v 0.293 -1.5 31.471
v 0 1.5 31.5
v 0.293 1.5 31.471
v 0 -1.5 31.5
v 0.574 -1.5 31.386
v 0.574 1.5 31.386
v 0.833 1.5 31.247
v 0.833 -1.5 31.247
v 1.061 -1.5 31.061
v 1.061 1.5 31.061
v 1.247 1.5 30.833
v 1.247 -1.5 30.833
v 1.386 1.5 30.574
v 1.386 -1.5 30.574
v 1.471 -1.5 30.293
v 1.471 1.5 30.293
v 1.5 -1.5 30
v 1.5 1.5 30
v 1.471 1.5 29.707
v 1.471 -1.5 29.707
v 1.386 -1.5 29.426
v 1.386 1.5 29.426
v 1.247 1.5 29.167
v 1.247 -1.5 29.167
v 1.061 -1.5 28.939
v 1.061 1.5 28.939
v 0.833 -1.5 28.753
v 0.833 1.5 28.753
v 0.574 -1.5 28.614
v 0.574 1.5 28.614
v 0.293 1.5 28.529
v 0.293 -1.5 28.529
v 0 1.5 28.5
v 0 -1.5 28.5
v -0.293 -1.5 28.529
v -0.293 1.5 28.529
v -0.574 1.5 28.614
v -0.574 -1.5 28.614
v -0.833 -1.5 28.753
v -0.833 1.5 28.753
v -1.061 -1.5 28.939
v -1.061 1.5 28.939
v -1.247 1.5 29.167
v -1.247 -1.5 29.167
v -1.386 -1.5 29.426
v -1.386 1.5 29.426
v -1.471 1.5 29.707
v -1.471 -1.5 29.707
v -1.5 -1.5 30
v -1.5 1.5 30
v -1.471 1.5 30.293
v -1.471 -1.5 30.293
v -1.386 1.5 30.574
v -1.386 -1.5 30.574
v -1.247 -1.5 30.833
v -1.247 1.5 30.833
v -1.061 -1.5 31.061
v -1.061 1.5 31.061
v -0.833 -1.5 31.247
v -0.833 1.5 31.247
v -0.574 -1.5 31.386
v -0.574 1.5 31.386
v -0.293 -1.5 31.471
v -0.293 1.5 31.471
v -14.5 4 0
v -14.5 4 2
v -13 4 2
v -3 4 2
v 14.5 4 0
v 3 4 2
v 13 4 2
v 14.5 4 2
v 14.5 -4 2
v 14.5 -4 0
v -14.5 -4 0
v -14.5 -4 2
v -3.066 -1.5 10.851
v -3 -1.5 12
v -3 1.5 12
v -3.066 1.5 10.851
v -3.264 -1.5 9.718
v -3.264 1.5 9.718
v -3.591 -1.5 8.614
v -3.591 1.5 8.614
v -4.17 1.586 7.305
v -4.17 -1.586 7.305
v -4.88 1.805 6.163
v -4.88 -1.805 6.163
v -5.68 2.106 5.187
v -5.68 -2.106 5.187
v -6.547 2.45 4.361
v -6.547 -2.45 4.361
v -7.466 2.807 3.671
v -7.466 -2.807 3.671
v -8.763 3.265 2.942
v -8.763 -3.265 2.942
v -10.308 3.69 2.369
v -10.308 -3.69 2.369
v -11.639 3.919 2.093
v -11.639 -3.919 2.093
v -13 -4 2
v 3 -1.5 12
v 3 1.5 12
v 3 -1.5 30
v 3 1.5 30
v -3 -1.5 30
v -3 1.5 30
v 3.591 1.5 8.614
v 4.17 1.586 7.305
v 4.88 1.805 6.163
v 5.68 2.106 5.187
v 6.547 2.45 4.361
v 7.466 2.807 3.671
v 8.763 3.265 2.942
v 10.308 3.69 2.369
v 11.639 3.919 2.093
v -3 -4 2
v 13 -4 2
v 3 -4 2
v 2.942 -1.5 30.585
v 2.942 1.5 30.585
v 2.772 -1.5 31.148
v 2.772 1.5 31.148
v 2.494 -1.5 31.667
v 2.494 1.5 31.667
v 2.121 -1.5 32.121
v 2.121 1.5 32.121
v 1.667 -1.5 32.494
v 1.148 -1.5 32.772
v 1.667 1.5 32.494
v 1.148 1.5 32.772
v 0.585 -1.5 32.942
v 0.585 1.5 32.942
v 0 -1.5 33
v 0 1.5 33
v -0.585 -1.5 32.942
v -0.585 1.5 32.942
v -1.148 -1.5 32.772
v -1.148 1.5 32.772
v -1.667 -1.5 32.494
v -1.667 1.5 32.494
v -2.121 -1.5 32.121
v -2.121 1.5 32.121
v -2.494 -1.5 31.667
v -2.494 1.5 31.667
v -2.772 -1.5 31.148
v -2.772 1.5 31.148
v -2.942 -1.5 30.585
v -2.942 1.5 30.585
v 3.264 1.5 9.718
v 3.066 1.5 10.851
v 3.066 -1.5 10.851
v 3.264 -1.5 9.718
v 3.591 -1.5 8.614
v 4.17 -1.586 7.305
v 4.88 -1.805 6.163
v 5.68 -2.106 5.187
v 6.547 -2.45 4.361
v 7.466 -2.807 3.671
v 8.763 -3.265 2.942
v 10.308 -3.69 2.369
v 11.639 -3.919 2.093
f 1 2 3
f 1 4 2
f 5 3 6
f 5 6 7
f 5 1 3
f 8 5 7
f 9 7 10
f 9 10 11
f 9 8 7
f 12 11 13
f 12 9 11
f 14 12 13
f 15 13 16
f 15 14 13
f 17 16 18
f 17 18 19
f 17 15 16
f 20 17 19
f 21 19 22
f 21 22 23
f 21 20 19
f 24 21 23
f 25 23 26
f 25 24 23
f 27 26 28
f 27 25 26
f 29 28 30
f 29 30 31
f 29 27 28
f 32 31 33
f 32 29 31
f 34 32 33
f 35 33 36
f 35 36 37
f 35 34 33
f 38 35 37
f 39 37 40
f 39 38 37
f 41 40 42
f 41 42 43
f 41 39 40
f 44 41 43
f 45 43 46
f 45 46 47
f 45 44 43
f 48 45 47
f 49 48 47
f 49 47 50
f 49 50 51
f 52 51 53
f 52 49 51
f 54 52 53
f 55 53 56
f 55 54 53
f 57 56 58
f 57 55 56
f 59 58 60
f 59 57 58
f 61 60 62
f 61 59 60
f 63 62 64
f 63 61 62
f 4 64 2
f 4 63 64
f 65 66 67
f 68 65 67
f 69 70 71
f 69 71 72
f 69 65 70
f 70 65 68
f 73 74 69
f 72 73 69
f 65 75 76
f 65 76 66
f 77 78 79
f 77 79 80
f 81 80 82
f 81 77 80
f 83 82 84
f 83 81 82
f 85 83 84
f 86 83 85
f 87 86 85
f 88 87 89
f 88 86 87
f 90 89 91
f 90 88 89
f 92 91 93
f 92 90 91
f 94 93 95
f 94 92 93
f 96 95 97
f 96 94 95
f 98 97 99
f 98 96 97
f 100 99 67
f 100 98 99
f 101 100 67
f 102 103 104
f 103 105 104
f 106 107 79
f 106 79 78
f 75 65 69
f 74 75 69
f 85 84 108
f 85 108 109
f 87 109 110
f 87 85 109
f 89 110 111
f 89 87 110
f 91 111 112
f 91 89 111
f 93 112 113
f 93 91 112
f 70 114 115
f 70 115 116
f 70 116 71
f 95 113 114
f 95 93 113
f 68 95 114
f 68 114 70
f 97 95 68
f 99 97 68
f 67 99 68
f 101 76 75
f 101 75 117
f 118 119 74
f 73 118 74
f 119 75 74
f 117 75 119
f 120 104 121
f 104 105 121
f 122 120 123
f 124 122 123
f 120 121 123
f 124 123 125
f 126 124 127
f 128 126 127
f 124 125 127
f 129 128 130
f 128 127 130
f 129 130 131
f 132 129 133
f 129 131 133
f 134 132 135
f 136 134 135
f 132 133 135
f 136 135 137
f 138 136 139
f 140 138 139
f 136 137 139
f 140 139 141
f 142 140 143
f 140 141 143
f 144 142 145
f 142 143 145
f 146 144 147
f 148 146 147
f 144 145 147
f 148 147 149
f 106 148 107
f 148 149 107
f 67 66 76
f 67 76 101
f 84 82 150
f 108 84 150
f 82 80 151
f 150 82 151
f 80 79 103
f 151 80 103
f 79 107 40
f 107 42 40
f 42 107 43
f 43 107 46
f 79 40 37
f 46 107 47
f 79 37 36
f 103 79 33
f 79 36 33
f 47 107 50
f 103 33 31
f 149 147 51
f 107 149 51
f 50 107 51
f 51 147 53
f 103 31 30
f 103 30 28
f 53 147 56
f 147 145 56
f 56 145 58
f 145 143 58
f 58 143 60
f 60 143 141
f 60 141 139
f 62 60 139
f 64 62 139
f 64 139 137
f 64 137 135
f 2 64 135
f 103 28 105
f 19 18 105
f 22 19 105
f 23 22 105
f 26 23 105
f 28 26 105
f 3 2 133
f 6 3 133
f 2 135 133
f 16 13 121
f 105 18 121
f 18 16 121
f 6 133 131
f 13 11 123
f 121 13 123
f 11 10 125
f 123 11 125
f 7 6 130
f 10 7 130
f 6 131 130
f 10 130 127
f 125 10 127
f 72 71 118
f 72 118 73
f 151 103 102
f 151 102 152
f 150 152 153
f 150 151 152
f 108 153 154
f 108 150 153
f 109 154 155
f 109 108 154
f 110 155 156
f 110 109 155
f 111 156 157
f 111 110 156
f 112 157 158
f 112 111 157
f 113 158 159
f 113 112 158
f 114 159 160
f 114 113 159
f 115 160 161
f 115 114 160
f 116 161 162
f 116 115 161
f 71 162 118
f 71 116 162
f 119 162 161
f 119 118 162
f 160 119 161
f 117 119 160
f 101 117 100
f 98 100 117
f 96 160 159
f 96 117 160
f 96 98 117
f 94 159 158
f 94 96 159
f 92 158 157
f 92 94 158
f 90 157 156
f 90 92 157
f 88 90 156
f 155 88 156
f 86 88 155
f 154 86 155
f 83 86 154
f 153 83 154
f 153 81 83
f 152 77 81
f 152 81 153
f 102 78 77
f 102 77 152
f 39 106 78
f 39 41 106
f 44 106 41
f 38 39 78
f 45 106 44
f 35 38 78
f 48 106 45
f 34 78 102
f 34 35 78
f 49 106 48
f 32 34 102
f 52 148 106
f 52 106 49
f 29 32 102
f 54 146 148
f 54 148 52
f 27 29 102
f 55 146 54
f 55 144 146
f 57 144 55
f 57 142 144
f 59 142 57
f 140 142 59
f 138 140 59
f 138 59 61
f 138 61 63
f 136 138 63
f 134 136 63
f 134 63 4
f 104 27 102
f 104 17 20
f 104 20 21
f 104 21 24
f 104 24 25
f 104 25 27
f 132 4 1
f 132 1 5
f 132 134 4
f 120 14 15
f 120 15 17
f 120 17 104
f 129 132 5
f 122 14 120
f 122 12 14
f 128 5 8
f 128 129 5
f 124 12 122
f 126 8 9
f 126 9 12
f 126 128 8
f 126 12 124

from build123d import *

# Parameters (mm, degrees)
SKETCH1_W           = 29
SKETCH1_H           = 8
BOSS_EXTRUDE1_DEPTH = 2
SKETCH2_R           = 1.5
BOSS_EXTRUDE2_DEPTH = 1.5
FILLET1_R           = 10


with BuildPart() as part:
    # Sketch1 → Boss-Extrude1 (new body)
    with BuildSketch(Plane.XY):
        Rectangle(SKETCH1_W, SKETCH1_H)
    extrude(amount=BOSS_EXTRUDE1_DEPTH)

    # Sketch2 → Boss-Extrude2 (add, symmetric)
    with BuildSketch(Plane(origin=(0, 0, 0), x_dir=(1, 0, 0), z_dir=(0, 1, 0))):
        with BuildLine():
            Line((-3, -2), (3, -2))
            Line((3, -2), (3, -30))
            ThreePointArc((3, -30), (0, -33), (-3, -30))
            Line((-3, -30), (-3, -2))
        make_face()
        with Locations(Location((0, -30, 0), (0, 0, 270))):
            Circle(SKETCH2_R, mode=Mode.SUBTRACT)
    extrude(amount=BOSS_EXTRUDE2_DEPTH, both=True)

    # Fillet1
    # the kernel refuses this fillet: 10 mm, written as the material it adds along each edge
    with BuildSketch(Plane(origin=(-3, 1.5, 2), x_dir=(0, 1, 0), z_dir=(1, 0, 0))) as fillet1_piece_1:
        with BuildLine():
            CenterArc((10, 6.614378278), FILLET1_R, 180, 41.409622109)
            Line((0, 6.614378278), (-0.2, 6.614378278))
            Line((-0.2, 6.614378278), (-0.2, 0))
            Line((-0.2, 0), (0, -0.2))
            ThreePointArc((0, -0.2), (1.25, -0.2), (2.35, -0.132287566))
            Line((2.35, -0.132287566), (2.5, 0))
        make_face()
    extrude(amount=6)
    with BuildSketch(Plane(origin=(-3, -1.5, 2), x_dir=(-1, 0, 0), z_dir=(0, 1, 0)), Plane(origin=(3, 1.5, 2), x_dir=(1, 0, 0), z_dir=(0, -1, 0))) as fillet1_piece_2:
        with BuildLine():
            CenterArc((FILLET1_R, FILLET1_R), FILLET1_R, 180, 90)
            Line((0, FILLET1_R), (-FILLET1_R * 0.02, FILLET1_R))
            Line((-FILLET1_R * 0.02, FILLET1_R), (-FILLET1_R * 0.02, -FILLET1_R * 0.02))
            Line((-FILLET1_R * 0.02, -FILLET1_R * 0.02), (FILLET1_R, -FILLET1_R * 0.02))
            Line((FILLET1_R, -FILLET1_R * 0.02), (FILLET1_R, 0))
        make_face()
    extrude(amount=3)
    with BuildSketch(Plane(origin=(-3, -1.5, 2), x_dir=(0, -1, 0), z_dir=(1, 0, 0))) as fillet1_piece_3:
        with BuildLine():
            CenterArc((10, -6.614378278), FILLET1_R, 138.590377891, 41.409622109)
            Line((0, -6.614378278), (-0.2, -6.614378278))
            Line((-0.2, -6.614378278), (-0.2, 0))
            Line((-0.2, 0), (0, 0.2))
            ThreePointArc((0, 0.2), (1.25, 0.2), (2.35, 0.132287566))
            Line((2.35, 0.132287566), (2.5, 0))
        make_face()
    extrude(amount=6)
    with BuildSketch(Plane(origin=(-19.535945694, 1.5, 2), x_dir=(0, 1, 0), z_dir=(1, 0, 0))) as fillet1_piece_4a_section:
        with BuildLine():
            CenterArc((10, 6.614378278), FILLET1_R, 180, 41.409622109)
            Line((0, 6.614378278), (-0.2, 6.614378278))
            Line((-0.2, 6.614378278), (-0.2, 0))
            Line((-0.2, 0), (0, -0.2))
            ThreePointArc((0, -0.2), (1.25, -0.2), (2.35, -0.132287566))
            Line((2.35, -0.132287566), (2.5, 0))
        make_face()
    fillet1_piece_4a = extrude(amount=22.535945694, mode=Mode.PRIVATE)
    fillet1_piece_4a = split(fillet1_piece_4a, bisect_by=Plane(origin=(-14.5, 2.097749904, 3.814075663), z_dir=(1, 0, 0)), keep=Keep.TOP, mode=Mode.PRIVATE)
    fillet1_piece_4a = split(fillet1_piece_4a, bisect_by=Plane(origin=(-3, 2.097749904, 3.814075663), z_dir=(-1, 0, 0)), keep=Keep.TOP, mode=Mode.PRIVATE)
    with BuildSketch(Plane(origin=(-3, -1.5, 2), x_dir=(-1, 0, 0), z_dir=(0, 1, 0))) as fillet1_piece_4b_section:
        with BuildLine():
            CenterArc((FILLET1_R, FILLET1_R), FILLET1_R, 180, 90)
            Line((0, FILLET1_R), (-FILLET1_R * 0.02, FILLET1_R))
            Line((-FILLET1_R * 0.02, FILLET1_R), (-FILLET1_R * 0.02, -FILLET1_R * 0.02))
            Line((-FILLET1_R * 0.02, -FILLET1_R * 0.02), (FILLET1_R, -FILLET1_R * 0.02))
            Line((FILLET1_R, -FILLET1_R * 0.02), (FILLET1_R, 0))
        make_face()
    fillet1_piece_4b = extrude(amount=28, mode=Mode.PRIVATE)
    fillet1_piece_4b = split(fillet1_piece_4b, bisect_by=Plane(origin=(-5.263951143, 4, 4.263951143), z_dir=(0, -1, 0)), keep=Keep.TOP, mode=Mode.PRIVATE)
    fillet1_piece_4b = split(fillet1_piece_4b, bisect_by=Plane(origin=(-5.263951143, 1.5, 4.263951143), z_dir=(0, 1, 0)), keep=Keep.TOP, mode=Mode.PRIVATE)
    fillet1_piece_4 = fillet1_piece_4a & fillet1_piece_4b
    add(fillet1_piece_4)
    with BuildSketch(Plane(origin=(3, 26.5, 2), x_dir=(1, 0, 0), z_dir=(0, -1, 0))) as fillet1_piece_5a_section:
        with BuildLine():
            CenterArc((FILLET1_R, FILLET1_R), FILLET1_R, 180, 90)
            Line((0, FILLET1_R), (-FILLET1_R * 0.02, FILLET1_R))
            Line((-FILLET1_R * 0.02, FILLET1_R), (-FILLET1_R * 0.02, -FILLET1_R * 0.02))
            Line((-FILLET1_R * 0.02, -FILLET1_R * 0.02), (FILLET1_R, -FILLET1_R * 0.02))
            Line((FILLET1_R, -FILLET1_R * 0.02), (FILLET1_R, 0))
        make_face()
    fillet1_piece_5a = extrude(amount=28, mode=Mode.PRIVATE)
    fillet1_piece_5a = split(fillet1_piece_5a, bisect_by=Plane(origin=(5.263951143, 4, 4.263951143), z_dir=(0, -1, 0)), keep=Keep.TOP, mode=Mode.PRIVATE)
    fillet1_piece_5a = split(fillet1_piece_5a, bisect_by=Plane(origin=(5.263951143, 1.5, 4.263951143), z_dir=(0, 1, 0)), keep=Keep.TOP, mode=Mode.PRIVATE)
    with BuildSketch(Plane(origin=(-3, 1.5, 2), x_dir=(0, 1, 0), z_dir=(1, 0, 0))) as fillet1_piece_5b_section:
        with BuildLine():
            CenterArc((10, 6.614378278), FILLET1_R, 180, 41.409622109)
            Line((0, 6.614378278), (-0.2, 6.614378278))
            Line((-0.2, 6.614378278), (-0.2, 0))
            Line((-0.2, 0), (0, -0.2))
            ThreePointArc((0, -0.2), (1.25, -0.2), (2.35, -0.132287566))
            Line((2.35, -0.132287566), (2.5, 0))
        make_face()
    fillet1_piece_5b = extrude(amount=22.535945694, mode=Mode.PRIVATE)
    fillet1_piece_5b = split(fillet1_piece_5b, bisect_by=Plane(origin=(14.5, 2.097749904, 3.814075663), z_dir=(-1, 0, 0)), keep=Keep.TOP, mode=Mode.PRIVATE)
    fillet1_piece_5b = split(fillet1_piece_5b, bisect_by=Plane(origin=(3, 2.097749904, 3.814075663), z_dir=(1, 0, 0)), keep=Keep.TOP, mode=Mode.PRIVATE)
    fillet1_piece_5 = fillet1_piece_5a & fillet1_piece_5b
    add(fillet1_piece_5)
    with BuildSketch(Plane(origin=(-19.535945694, -1.5, 2), x_dir=(0, -1, 0), z_dir=(1, 0, 0))) as fillet1_piece_6a_section:
        with BuildLine():
            CenterArc((10, -6.614378278), FILLET1_R, 138.590377891, 41.409622109)
            Line((0, -6.614378278), (-0.2, -6.614378278))
            Line((-0.2, -6.614378278), (-0.2, 0))
            Line((-0.2, 0), (0, 0.2))
            ThreePointArc((0, 0.2), (1.25, 0.2), (2.35, 0.132287566))
            Line((2.35, 0.132287566), (2.5, 0))
        make_face()
    fillet1_piece_6a = extrude(amount=22.535945694, mode=Mode.PRIVATE)
    fillet1_piece_6a = split(fillet1_piece_6a, bisect_by=Plane(origin=(-14.5, -2.097749904, 3.814075663), z_dir=(1, 0, 0)), keep=Keep.TOP, mode=Mode.PRIVATE)
    fillet1_piece_6a = split(fillet1_piece_6a, bisect_by=Plane(origin=(-3, -2.097749904, 3.814075663), z_dir=(-1, 0, 0)), keep=Keep.TOP, mode=Mode.PRIVATE)
    with BuildSketch(Plane(origin=(-3, -26.5, 2), x_dir=(-1, 0, 0), z_dir=(0, 1, 0))) as fillet1_piece_6b_section:
        with BuildLine():
            CenterArc((FILLET1_R, FILLET1_R), FILLET1_R, 180, 90)
            Line((0, FILLET1_R), (-FILLET1_R * 0.02, FILLET1_R))
            Line((-FILLET1_R * 0.02, FILLET1_R), (-FILLET1_R * 0.02, -FILLET1_R * 0.02))
            Line((-FILLET1_R * 0.02, -FILLET1_R * 0.02), (FILLET1_R, -FILLET1_R * 0.02))
            Line((FILLET1_R, -FILLET1_R * 0.02), (FILLET1_R, 0))
        make_face()
    fillet1_piece_6b = extrude(amount=28, mode=Mode.PRIVATE)
    fillet1_piece_6b = split(fillet1_piece_6b, bisect_by=Plane(origin=(-5.263951143, -4, 4.263951143), z_dir=(0, 1, 0)), keep=Keep.TOP, mode=Mode.PRIVATE)
    fillet1_piece_6b = split(fillet1_piece_6b, bisect_by=Plane(origin=(-5.263951143, -1.5, 4.263951143), z_dir=(0, -1, 0)), keep=Keep.TOP, mode=Mode.PRIVATE)
    fillet1_piece_6 = fillet1_piece_6a & fillet1_piece_6b
    add(fillet1_piece_6)
    with BuildSketch(Plane(origin=(-3, -1.5, 2), x_dir=(0, -1, 0), z_dir=(1, 0, 0))) as fillet1_piece_7a_section:
        with BuildLine():
            CenterArc((10, -6.614378278), FILLET1_R, 138.590377891, 41.409622109)
            Line((0, -6.614378278), (-0.2, -6.614378278))
            Line((-0.2, -6.614378278), (-0.2, 0))
            Line((-0.2, 0), (0, 0.2))
            ThreePointArc((0, 0.2), (1.25, 0.2), (2.35, 0.132287566))
            Line((2.35, 0.132287566), (2.5, 0))
        make_face()
    fillet1_piece_7a = extrude(amount=22.535945694, mode=Mode.PRIVATE)
    fillet1_piece_7a = split(fillet1_piece_7a, bisect_by=Plane(origin=(14.5, -2.097749904, 3.814075663), z_dir=(-1, 0, 0)), keep=Keep.TOP, mode=Mode.PRIVATE)
    fillet1_piece_7a = split(fillet1_piece_7a, bisect_by=Plane(origin=(3, -2.097749904, 3.814075663), z_dir=(1, 0, 0)), keep=Keep.TOP, mode=Mode.PRIVATE)
    with BuildSketch(Plane(origin=(3, 1.5, 2), x_dir=(1, 0, 0), z_dir=(0, -1, 0))) as fillet1_piece_7b_section:
        with BuildLine():
            CenterArc((FILLET1_R, FILLET1_R), FILLET1_R, 180, 90)
            Line((0, FILLET1_R), (-FILLET1_R * 0.02, FILLET1_R))
            Line((-FILLET1_R * 0.02, FILLET1_R), (-FILLET1_R * 0.02, -FILLET1_R * 0.02))
            Line((-FILLET1_R * 0.02, -FILLET1_R * 0.02), (FILLET1_R, -FILLET1_R * 0.02))
            Line((FILLET1_R, -FILLET1_R * 0.02), (FILLET1_R, 0))
        make_face()
    fillet1_piece_7b = extrude(amount=28, mode=Mode.PRIVATE)
    fillet1_piece_7b = split(fillet1_piece_7b, bisect_by=Plane(origin=(5.263951143, -4, 4.263951143), z_dir=(0, 1, 0)), keep=Keep.TOP, mode=Mode.PRIVATE)
    fillet1_piece_7b = split(fillet1_piece_7b, bisect_by=Plane(origin=(5.263951143, -1.5, 4.263951143), z_dir=(0, -1, 0)), keep=Keep.TOP, mode=Mode.PRIVATE)
    fillet1_piece_7 = fillet1_piece_7a & fillet1_piece_7b
    add(fillet1_piece_7)


solid = part.part
